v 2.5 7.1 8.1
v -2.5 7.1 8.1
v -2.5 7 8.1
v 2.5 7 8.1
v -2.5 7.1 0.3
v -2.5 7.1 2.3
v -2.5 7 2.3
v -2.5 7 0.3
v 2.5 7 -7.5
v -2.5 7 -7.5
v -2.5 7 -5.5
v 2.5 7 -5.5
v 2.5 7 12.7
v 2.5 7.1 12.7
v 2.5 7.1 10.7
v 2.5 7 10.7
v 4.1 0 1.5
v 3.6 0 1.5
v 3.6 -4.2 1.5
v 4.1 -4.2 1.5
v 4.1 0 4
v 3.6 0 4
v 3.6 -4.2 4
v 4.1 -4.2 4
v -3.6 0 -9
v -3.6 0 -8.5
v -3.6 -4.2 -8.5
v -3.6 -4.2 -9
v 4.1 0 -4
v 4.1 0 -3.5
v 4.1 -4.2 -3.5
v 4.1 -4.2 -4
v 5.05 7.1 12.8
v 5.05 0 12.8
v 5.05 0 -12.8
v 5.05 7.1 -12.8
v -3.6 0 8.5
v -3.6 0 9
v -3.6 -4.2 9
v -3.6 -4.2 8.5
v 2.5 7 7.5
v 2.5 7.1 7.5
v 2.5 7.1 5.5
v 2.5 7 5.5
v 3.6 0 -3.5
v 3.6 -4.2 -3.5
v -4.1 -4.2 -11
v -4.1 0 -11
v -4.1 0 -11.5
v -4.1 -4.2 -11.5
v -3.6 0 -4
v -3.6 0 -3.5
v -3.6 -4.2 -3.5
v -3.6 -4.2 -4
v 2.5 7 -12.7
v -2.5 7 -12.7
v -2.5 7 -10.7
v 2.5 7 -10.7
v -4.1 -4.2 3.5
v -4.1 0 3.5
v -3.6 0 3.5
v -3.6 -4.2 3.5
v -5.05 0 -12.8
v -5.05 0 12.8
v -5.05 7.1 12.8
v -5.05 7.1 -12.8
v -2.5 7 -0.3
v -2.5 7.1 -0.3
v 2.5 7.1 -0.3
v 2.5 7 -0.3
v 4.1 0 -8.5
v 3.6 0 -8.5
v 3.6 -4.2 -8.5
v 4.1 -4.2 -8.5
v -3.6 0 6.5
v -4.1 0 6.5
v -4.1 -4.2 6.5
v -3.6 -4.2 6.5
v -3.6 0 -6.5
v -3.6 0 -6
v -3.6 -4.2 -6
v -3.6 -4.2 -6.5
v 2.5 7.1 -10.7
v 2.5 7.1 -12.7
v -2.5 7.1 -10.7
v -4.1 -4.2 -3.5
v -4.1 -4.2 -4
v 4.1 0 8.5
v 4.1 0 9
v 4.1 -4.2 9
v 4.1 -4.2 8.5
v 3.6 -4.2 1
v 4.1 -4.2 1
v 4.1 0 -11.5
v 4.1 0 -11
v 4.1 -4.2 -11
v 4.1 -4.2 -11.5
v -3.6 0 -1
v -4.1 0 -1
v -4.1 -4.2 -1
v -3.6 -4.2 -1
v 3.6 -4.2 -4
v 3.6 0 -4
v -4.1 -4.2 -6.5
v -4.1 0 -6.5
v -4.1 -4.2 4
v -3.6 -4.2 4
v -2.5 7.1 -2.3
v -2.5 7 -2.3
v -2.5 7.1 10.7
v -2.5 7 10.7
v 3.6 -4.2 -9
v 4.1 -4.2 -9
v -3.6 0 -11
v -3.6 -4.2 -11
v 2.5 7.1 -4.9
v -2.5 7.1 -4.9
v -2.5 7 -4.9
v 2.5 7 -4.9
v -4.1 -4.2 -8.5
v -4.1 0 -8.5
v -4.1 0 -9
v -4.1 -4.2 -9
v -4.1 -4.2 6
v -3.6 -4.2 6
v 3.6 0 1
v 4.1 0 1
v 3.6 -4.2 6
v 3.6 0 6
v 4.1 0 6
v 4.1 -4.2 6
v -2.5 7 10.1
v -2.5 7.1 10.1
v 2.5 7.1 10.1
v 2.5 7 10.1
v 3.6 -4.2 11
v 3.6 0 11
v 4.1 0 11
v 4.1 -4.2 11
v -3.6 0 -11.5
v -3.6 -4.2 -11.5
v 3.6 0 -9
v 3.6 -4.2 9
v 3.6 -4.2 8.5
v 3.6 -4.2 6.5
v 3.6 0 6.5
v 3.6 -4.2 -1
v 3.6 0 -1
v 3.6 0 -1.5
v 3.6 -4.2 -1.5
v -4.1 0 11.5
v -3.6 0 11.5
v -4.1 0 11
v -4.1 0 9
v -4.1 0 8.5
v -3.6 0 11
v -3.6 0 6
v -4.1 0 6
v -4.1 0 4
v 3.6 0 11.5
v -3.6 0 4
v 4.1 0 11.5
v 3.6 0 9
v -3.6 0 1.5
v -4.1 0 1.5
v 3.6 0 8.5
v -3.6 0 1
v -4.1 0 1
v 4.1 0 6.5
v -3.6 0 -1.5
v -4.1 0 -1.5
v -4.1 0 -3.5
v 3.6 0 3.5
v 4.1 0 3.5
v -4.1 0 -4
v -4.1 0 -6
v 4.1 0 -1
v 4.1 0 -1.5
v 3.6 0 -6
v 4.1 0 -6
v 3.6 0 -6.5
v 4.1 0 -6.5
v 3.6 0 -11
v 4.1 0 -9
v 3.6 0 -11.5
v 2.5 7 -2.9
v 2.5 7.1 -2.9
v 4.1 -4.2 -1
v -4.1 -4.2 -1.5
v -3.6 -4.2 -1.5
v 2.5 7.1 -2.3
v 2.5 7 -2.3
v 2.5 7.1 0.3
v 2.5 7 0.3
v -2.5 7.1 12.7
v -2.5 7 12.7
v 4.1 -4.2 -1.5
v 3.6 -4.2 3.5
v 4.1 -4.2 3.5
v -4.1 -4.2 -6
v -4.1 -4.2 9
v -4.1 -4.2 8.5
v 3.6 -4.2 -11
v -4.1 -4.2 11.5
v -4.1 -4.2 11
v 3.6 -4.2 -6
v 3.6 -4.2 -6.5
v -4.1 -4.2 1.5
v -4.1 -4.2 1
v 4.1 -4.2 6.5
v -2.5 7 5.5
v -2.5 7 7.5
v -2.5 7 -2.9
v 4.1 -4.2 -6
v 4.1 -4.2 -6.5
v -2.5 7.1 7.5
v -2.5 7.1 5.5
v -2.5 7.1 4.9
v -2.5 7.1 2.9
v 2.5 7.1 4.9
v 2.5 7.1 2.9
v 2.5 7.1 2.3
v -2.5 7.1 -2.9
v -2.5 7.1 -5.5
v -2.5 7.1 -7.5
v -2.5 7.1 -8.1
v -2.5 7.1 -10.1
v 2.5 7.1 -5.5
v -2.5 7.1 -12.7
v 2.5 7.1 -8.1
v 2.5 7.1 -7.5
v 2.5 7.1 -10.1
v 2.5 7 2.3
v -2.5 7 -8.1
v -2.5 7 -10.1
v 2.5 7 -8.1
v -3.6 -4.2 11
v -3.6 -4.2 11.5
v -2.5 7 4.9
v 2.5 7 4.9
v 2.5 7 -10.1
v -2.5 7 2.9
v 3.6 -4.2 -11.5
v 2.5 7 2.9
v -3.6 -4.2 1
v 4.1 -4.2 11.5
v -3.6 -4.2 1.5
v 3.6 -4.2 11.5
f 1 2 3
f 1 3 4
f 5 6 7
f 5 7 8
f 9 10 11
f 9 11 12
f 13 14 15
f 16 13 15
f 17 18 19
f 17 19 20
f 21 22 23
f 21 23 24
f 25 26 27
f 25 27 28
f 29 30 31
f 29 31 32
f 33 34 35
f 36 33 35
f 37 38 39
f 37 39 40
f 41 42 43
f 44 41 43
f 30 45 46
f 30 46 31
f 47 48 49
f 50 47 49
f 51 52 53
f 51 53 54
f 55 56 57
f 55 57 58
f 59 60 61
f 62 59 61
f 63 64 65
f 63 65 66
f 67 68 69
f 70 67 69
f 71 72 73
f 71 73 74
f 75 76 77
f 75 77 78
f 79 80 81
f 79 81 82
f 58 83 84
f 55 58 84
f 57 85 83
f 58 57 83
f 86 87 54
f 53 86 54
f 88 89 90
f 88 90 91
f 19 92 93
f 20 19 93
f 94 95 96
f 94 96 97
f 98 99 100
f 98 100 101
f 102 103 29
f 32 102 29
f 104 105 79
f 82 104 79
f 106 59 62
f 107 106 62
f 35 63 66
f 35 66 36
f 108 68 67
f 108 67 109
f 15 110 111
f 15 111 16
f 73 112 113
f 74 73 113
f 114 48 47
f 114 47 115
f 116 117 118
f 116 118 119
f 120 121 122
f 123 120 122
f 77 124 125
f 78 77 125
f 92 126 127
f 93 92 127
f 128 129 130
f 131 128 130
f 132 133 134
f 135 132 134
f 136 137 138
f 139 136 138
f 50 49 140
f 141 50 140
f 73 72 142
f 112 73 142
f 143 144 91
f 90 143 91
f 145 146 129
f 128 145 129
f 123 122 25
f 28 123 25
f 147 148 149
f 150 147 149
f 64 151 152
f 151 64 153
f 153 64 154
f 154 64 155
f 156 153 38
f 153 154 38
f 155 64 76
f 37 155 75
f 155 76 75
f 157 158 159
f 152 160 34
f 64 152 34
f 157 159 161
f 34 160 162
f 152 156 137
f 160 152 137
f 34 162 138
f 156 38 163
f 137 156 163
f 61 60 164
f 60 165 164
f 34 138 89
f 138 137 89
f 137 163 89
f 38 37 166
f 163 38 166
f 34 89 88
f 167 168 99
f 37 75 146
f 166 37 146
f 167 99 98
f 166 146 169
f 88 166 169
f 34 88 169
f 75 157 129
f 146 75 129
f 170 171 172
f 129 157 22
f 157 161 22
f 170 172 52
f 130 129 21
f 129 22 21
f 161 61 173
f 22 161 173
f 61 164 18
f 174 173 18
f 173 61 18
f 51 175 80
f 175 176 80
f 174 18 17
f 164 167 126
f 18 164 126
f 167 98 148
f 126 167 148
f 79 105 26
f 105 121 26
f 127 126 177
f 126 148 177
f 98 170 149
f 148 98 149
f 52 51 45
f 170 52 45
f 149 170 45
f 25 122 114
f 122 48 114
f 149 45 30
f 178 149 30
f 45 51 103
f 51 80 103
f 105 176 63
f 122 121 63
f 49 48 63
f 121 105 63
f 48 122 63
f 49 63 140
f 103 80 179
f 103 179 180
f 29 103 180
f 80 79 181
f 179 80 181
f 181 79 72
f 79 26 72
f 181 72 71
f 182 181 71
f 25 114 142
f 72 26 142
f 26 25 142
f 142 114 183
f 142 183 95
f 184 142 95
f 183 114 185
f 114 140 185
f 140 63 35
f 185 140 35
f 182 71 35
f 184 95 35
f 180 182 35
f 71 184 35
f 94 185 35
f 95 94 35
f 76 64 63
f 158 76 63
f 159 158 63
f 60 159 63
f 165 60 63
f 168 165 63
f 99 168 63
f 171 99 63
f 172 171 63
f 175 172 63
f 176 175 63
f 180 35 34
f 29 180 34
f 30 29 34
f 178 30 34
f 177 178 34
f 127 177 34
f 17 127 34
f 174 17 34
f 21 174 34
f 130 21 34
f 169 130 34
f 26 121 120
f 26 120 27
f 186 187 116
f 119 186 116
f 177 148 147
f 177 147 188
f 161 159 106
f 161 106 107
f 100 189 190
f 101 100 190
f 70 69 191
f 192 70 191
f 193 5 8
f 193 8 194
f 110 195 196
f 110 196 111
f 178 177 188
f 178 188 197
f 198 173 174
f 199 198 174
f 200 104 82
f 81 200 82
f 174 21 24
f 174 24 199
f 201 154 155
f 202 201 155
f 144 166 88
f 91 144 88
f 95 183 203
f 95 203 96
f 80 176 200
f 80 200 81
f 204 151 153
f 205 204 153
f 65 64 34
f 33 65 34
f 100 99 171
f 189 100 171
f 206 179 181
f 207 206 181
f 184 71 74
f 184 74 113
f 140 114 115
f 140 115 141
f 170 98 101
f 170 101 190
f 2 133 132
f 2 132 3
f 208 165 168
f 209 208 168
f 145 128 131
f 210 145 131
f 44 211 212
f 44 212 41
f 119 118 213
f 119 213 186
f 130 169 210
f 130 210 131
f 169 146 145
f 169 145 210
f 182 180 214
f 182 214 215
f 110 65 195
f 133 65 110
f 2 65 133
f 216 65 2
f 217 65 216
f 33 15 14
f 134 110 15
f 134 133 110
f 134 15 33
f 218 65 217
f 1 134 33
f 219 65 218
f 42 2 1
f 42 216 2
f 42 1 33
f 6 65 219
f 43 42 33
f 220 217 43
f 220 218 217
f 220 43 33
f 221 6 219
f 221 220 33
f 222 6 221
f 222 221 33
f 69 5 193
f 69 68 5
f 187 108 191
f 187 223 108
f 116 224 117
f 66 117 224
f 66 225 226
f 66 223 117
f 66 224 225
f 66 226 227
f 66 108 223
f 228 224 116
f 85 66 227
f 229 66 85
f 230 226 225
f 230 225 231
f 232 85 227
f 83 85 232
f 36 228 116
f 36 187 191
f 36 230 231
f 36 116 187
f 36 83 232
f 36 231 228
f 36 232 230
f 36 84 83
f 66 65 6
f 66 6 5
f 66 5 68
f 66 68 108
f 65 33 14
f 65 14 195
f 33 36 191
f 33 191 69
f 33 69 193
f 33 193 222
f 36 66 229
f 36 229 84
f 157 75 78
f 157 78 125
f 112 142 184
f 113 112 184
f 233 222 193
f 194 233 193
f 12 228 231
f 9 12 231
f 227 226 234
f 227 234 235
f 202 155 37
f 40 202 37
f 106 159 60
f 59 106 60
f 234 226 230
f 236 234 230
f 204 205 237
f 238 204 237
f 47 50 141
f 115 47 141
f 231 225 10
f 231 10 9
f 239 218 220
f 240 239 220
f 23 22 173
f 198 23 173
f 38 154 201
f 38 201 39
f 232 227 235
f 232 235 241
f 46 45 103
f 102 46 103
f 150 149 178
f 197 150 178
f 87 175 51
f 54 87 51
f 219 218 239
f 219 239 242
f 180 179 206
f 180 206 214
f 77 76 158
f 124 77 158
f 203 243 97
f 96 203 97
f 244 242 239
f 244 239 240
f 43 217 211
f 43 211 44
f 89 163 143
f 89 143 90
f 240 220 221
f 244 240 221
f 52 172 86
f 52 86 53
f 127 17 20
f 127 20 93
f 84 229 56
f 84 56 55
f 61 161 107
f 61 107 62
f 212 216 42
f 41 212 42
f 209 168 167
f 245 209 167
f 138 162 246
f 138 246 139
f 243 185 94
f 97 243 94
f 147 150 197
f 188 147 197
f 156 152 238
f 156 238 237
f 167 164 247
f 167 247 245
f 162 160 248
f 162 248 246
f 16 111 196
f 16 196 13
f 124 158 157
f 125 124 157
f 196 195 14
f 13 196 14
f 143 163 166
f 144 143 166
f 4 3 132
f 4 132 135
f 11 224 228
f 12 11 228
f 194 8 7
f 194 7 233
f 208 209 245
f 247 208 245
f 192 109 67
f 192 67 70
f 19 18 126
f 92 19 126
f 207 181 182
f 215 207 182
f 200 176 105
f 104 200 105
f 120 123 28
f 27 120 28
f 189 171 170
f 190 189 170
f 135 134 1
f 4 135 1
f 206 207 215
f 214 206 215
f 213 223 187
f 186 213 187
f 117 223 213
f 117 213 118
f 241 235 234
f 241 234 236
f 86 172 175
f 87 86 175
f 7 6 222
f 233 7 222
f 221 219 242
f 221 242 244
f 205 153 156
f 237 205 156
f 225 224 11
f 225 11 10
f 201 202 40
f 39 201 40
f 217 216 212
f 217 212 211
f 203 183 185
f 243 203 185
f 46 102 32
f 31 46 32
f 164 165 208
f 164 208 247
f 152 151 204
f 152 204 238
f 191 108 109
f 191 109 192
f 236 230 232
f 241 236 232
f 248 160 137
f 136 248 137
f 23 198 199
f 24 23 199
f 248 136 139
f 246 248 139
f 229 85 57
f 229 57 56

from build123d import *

# Parameters (mm, degrees)
SKETCH1_W           = 10.1
SKETCH1_H           = 25.6
BOSS_EXTRUDE1_DEPTH = 7.1
SKETCH2_W           = 0.5
SKETCH2_H           = 0.5
BOSS_EXTRUDE2_DEPTH = 4.2
SKETCH3_W           = 5
SKETCH3_H           = 2
CUT_EXTRUDE1_DEPTH  = 0.1


with BuildPart() as part:
    # Sketch1 → Boss-Extrude1 (new body)
    with BuildSketch(Plane(origin=(0, 0, 0), x_dir=(1, 0, 0), z_dir=(0, 1, 0))):
        Rectangle(SKETCH1_W, SKETCH1_H)
    extrude(amount=BOSS_EXTRUDE1_DEPTH)

    # Sketch2 → Boss-Extrude2 (add)
    with BuildSketch(Plane(origin=(0, 0, 0), x_dir=(1, 0, 0), z_dir=(0, 1, 0))):
        with Locations((3.85, -11.25)):
            Rectangle(SKETCH2_W, SKETCH2_H)
        with Locations((-3.85, -11.25)):
            Rectangle(SKETCH2_W, SKETCH2_H)
        with Locations((3.85, -8.75)):
            Rectangle(SKETCH2_W, SKETCH2_H)
        with Locations((3.85, -6.25)):
            Rectangle(SKETCH2_W, SKETCH2_H)
        with Locations((3.85, -3.75)):
            Rectangle(SKETCH2_W, SKETCH2_H)
        with Locations((3.85, -1.25)):
            Rectangle(SKETCH2_W, SKETCH2_H)
        with Locations((3.85, 1.25)):
            Rectangle(SKETCH2_W, SKETCH2_H)
        with Locations((3.85, 3.75)):
            Rectangle(SKETCH2_W, SKETCH2_H)
        with Locations((3.85, 6.25)):
            Rectangle(SKETCH2_W, SKETCH2_H)
        with Locations((3.85, 8.75)):
            Rectangle(SKETCH2_W, SKETCH2_H)
        with Locations((3.85, 11.25)):
            Rectangle(SKETCH2_W, SKETCH2_H)
        with Locations((-3.85, -8.75)):
            Rectangle(SKETCH2_W, SKETCH2_H)
        with Locations((-3.85, -6.25)):
            Rectangle(SKETCH2_W, SKETCH2_H)
        with Locations((-3.85, -3.75)):
            Rectangle(SKETCH2_W, SKETCH2_H)
        with Locations((-3.85, -1.25)):
            Rectangle(SKETCH2_W, SKETCH2_H)
        with Locations((-3.85, 1.25)):
            Rectangle(SKETCH2_W, SKETCH2_H)
        with Locations((-3.85, 3.75)):
            Rectangle(SKETCH2_W, SKETCH2_H)
        with Locations((-3.85, 6.25)):
            Rectangle(SKETCH2_W, SKETCH2_H)
        with Locations((-3.85, 8.75)):
            Rectangle(SKETCH2_W, SKETCH2_H)
        with Locations((-3.85, 11.25)):
            Rectangle(SKETCH2_W, SKETCH2_H)
    extrude(amount=-BOSS_EXTRUDE2_DEPTH)

    # Sketch3 → Cut-Extrude1 (cut)
    with BuildSketch(Plane(origin=(0, 7.1, 0), x_dir=(1, 0, 0), z_dir=(0, 1, 0))):
        with Locations((0, 9.1)):
            Rectangle(SKETCH3_W, SKETCH3_H)
        with Locations((0, 11.7)):
            Rectangle(SKETCH3_W, SKETCH3_H)
        with Locations((0, 6.5)):
            Rectangle(SKETCH3_W, SKETCH3_H)
        with Locations((0, 3.9)):
            Rectangle(SKETCH3_W, SKETCH3_H)
        with Locations((0, 1.3)):
            Rectangle(SKETCH3_W, SKETCH3_H)
        with Locations((0, -1.3)):
            Rectangle(SKETCH3_W, SKETCH3_H)
        with Locations((0, -3.9)):
            Rectangle(SKETCH3_W, SKETCH3_H)
        with Locations((0, -6.5)):
            Rectangle(SKETCH3_W, SKETCH3_H)
        with Locations((0, -9.1)):
            Rectangle(SKETCH3_W, SKETCH3_H)
        with Locations((0, -11.7)):
            Rectangle(SKETCH3_W, SKETCH3_H)
    extrude(amount=-CUT_EXTRUDE1_DEPTH, mode=Mode.SUBTRACT)


solid = part.part
